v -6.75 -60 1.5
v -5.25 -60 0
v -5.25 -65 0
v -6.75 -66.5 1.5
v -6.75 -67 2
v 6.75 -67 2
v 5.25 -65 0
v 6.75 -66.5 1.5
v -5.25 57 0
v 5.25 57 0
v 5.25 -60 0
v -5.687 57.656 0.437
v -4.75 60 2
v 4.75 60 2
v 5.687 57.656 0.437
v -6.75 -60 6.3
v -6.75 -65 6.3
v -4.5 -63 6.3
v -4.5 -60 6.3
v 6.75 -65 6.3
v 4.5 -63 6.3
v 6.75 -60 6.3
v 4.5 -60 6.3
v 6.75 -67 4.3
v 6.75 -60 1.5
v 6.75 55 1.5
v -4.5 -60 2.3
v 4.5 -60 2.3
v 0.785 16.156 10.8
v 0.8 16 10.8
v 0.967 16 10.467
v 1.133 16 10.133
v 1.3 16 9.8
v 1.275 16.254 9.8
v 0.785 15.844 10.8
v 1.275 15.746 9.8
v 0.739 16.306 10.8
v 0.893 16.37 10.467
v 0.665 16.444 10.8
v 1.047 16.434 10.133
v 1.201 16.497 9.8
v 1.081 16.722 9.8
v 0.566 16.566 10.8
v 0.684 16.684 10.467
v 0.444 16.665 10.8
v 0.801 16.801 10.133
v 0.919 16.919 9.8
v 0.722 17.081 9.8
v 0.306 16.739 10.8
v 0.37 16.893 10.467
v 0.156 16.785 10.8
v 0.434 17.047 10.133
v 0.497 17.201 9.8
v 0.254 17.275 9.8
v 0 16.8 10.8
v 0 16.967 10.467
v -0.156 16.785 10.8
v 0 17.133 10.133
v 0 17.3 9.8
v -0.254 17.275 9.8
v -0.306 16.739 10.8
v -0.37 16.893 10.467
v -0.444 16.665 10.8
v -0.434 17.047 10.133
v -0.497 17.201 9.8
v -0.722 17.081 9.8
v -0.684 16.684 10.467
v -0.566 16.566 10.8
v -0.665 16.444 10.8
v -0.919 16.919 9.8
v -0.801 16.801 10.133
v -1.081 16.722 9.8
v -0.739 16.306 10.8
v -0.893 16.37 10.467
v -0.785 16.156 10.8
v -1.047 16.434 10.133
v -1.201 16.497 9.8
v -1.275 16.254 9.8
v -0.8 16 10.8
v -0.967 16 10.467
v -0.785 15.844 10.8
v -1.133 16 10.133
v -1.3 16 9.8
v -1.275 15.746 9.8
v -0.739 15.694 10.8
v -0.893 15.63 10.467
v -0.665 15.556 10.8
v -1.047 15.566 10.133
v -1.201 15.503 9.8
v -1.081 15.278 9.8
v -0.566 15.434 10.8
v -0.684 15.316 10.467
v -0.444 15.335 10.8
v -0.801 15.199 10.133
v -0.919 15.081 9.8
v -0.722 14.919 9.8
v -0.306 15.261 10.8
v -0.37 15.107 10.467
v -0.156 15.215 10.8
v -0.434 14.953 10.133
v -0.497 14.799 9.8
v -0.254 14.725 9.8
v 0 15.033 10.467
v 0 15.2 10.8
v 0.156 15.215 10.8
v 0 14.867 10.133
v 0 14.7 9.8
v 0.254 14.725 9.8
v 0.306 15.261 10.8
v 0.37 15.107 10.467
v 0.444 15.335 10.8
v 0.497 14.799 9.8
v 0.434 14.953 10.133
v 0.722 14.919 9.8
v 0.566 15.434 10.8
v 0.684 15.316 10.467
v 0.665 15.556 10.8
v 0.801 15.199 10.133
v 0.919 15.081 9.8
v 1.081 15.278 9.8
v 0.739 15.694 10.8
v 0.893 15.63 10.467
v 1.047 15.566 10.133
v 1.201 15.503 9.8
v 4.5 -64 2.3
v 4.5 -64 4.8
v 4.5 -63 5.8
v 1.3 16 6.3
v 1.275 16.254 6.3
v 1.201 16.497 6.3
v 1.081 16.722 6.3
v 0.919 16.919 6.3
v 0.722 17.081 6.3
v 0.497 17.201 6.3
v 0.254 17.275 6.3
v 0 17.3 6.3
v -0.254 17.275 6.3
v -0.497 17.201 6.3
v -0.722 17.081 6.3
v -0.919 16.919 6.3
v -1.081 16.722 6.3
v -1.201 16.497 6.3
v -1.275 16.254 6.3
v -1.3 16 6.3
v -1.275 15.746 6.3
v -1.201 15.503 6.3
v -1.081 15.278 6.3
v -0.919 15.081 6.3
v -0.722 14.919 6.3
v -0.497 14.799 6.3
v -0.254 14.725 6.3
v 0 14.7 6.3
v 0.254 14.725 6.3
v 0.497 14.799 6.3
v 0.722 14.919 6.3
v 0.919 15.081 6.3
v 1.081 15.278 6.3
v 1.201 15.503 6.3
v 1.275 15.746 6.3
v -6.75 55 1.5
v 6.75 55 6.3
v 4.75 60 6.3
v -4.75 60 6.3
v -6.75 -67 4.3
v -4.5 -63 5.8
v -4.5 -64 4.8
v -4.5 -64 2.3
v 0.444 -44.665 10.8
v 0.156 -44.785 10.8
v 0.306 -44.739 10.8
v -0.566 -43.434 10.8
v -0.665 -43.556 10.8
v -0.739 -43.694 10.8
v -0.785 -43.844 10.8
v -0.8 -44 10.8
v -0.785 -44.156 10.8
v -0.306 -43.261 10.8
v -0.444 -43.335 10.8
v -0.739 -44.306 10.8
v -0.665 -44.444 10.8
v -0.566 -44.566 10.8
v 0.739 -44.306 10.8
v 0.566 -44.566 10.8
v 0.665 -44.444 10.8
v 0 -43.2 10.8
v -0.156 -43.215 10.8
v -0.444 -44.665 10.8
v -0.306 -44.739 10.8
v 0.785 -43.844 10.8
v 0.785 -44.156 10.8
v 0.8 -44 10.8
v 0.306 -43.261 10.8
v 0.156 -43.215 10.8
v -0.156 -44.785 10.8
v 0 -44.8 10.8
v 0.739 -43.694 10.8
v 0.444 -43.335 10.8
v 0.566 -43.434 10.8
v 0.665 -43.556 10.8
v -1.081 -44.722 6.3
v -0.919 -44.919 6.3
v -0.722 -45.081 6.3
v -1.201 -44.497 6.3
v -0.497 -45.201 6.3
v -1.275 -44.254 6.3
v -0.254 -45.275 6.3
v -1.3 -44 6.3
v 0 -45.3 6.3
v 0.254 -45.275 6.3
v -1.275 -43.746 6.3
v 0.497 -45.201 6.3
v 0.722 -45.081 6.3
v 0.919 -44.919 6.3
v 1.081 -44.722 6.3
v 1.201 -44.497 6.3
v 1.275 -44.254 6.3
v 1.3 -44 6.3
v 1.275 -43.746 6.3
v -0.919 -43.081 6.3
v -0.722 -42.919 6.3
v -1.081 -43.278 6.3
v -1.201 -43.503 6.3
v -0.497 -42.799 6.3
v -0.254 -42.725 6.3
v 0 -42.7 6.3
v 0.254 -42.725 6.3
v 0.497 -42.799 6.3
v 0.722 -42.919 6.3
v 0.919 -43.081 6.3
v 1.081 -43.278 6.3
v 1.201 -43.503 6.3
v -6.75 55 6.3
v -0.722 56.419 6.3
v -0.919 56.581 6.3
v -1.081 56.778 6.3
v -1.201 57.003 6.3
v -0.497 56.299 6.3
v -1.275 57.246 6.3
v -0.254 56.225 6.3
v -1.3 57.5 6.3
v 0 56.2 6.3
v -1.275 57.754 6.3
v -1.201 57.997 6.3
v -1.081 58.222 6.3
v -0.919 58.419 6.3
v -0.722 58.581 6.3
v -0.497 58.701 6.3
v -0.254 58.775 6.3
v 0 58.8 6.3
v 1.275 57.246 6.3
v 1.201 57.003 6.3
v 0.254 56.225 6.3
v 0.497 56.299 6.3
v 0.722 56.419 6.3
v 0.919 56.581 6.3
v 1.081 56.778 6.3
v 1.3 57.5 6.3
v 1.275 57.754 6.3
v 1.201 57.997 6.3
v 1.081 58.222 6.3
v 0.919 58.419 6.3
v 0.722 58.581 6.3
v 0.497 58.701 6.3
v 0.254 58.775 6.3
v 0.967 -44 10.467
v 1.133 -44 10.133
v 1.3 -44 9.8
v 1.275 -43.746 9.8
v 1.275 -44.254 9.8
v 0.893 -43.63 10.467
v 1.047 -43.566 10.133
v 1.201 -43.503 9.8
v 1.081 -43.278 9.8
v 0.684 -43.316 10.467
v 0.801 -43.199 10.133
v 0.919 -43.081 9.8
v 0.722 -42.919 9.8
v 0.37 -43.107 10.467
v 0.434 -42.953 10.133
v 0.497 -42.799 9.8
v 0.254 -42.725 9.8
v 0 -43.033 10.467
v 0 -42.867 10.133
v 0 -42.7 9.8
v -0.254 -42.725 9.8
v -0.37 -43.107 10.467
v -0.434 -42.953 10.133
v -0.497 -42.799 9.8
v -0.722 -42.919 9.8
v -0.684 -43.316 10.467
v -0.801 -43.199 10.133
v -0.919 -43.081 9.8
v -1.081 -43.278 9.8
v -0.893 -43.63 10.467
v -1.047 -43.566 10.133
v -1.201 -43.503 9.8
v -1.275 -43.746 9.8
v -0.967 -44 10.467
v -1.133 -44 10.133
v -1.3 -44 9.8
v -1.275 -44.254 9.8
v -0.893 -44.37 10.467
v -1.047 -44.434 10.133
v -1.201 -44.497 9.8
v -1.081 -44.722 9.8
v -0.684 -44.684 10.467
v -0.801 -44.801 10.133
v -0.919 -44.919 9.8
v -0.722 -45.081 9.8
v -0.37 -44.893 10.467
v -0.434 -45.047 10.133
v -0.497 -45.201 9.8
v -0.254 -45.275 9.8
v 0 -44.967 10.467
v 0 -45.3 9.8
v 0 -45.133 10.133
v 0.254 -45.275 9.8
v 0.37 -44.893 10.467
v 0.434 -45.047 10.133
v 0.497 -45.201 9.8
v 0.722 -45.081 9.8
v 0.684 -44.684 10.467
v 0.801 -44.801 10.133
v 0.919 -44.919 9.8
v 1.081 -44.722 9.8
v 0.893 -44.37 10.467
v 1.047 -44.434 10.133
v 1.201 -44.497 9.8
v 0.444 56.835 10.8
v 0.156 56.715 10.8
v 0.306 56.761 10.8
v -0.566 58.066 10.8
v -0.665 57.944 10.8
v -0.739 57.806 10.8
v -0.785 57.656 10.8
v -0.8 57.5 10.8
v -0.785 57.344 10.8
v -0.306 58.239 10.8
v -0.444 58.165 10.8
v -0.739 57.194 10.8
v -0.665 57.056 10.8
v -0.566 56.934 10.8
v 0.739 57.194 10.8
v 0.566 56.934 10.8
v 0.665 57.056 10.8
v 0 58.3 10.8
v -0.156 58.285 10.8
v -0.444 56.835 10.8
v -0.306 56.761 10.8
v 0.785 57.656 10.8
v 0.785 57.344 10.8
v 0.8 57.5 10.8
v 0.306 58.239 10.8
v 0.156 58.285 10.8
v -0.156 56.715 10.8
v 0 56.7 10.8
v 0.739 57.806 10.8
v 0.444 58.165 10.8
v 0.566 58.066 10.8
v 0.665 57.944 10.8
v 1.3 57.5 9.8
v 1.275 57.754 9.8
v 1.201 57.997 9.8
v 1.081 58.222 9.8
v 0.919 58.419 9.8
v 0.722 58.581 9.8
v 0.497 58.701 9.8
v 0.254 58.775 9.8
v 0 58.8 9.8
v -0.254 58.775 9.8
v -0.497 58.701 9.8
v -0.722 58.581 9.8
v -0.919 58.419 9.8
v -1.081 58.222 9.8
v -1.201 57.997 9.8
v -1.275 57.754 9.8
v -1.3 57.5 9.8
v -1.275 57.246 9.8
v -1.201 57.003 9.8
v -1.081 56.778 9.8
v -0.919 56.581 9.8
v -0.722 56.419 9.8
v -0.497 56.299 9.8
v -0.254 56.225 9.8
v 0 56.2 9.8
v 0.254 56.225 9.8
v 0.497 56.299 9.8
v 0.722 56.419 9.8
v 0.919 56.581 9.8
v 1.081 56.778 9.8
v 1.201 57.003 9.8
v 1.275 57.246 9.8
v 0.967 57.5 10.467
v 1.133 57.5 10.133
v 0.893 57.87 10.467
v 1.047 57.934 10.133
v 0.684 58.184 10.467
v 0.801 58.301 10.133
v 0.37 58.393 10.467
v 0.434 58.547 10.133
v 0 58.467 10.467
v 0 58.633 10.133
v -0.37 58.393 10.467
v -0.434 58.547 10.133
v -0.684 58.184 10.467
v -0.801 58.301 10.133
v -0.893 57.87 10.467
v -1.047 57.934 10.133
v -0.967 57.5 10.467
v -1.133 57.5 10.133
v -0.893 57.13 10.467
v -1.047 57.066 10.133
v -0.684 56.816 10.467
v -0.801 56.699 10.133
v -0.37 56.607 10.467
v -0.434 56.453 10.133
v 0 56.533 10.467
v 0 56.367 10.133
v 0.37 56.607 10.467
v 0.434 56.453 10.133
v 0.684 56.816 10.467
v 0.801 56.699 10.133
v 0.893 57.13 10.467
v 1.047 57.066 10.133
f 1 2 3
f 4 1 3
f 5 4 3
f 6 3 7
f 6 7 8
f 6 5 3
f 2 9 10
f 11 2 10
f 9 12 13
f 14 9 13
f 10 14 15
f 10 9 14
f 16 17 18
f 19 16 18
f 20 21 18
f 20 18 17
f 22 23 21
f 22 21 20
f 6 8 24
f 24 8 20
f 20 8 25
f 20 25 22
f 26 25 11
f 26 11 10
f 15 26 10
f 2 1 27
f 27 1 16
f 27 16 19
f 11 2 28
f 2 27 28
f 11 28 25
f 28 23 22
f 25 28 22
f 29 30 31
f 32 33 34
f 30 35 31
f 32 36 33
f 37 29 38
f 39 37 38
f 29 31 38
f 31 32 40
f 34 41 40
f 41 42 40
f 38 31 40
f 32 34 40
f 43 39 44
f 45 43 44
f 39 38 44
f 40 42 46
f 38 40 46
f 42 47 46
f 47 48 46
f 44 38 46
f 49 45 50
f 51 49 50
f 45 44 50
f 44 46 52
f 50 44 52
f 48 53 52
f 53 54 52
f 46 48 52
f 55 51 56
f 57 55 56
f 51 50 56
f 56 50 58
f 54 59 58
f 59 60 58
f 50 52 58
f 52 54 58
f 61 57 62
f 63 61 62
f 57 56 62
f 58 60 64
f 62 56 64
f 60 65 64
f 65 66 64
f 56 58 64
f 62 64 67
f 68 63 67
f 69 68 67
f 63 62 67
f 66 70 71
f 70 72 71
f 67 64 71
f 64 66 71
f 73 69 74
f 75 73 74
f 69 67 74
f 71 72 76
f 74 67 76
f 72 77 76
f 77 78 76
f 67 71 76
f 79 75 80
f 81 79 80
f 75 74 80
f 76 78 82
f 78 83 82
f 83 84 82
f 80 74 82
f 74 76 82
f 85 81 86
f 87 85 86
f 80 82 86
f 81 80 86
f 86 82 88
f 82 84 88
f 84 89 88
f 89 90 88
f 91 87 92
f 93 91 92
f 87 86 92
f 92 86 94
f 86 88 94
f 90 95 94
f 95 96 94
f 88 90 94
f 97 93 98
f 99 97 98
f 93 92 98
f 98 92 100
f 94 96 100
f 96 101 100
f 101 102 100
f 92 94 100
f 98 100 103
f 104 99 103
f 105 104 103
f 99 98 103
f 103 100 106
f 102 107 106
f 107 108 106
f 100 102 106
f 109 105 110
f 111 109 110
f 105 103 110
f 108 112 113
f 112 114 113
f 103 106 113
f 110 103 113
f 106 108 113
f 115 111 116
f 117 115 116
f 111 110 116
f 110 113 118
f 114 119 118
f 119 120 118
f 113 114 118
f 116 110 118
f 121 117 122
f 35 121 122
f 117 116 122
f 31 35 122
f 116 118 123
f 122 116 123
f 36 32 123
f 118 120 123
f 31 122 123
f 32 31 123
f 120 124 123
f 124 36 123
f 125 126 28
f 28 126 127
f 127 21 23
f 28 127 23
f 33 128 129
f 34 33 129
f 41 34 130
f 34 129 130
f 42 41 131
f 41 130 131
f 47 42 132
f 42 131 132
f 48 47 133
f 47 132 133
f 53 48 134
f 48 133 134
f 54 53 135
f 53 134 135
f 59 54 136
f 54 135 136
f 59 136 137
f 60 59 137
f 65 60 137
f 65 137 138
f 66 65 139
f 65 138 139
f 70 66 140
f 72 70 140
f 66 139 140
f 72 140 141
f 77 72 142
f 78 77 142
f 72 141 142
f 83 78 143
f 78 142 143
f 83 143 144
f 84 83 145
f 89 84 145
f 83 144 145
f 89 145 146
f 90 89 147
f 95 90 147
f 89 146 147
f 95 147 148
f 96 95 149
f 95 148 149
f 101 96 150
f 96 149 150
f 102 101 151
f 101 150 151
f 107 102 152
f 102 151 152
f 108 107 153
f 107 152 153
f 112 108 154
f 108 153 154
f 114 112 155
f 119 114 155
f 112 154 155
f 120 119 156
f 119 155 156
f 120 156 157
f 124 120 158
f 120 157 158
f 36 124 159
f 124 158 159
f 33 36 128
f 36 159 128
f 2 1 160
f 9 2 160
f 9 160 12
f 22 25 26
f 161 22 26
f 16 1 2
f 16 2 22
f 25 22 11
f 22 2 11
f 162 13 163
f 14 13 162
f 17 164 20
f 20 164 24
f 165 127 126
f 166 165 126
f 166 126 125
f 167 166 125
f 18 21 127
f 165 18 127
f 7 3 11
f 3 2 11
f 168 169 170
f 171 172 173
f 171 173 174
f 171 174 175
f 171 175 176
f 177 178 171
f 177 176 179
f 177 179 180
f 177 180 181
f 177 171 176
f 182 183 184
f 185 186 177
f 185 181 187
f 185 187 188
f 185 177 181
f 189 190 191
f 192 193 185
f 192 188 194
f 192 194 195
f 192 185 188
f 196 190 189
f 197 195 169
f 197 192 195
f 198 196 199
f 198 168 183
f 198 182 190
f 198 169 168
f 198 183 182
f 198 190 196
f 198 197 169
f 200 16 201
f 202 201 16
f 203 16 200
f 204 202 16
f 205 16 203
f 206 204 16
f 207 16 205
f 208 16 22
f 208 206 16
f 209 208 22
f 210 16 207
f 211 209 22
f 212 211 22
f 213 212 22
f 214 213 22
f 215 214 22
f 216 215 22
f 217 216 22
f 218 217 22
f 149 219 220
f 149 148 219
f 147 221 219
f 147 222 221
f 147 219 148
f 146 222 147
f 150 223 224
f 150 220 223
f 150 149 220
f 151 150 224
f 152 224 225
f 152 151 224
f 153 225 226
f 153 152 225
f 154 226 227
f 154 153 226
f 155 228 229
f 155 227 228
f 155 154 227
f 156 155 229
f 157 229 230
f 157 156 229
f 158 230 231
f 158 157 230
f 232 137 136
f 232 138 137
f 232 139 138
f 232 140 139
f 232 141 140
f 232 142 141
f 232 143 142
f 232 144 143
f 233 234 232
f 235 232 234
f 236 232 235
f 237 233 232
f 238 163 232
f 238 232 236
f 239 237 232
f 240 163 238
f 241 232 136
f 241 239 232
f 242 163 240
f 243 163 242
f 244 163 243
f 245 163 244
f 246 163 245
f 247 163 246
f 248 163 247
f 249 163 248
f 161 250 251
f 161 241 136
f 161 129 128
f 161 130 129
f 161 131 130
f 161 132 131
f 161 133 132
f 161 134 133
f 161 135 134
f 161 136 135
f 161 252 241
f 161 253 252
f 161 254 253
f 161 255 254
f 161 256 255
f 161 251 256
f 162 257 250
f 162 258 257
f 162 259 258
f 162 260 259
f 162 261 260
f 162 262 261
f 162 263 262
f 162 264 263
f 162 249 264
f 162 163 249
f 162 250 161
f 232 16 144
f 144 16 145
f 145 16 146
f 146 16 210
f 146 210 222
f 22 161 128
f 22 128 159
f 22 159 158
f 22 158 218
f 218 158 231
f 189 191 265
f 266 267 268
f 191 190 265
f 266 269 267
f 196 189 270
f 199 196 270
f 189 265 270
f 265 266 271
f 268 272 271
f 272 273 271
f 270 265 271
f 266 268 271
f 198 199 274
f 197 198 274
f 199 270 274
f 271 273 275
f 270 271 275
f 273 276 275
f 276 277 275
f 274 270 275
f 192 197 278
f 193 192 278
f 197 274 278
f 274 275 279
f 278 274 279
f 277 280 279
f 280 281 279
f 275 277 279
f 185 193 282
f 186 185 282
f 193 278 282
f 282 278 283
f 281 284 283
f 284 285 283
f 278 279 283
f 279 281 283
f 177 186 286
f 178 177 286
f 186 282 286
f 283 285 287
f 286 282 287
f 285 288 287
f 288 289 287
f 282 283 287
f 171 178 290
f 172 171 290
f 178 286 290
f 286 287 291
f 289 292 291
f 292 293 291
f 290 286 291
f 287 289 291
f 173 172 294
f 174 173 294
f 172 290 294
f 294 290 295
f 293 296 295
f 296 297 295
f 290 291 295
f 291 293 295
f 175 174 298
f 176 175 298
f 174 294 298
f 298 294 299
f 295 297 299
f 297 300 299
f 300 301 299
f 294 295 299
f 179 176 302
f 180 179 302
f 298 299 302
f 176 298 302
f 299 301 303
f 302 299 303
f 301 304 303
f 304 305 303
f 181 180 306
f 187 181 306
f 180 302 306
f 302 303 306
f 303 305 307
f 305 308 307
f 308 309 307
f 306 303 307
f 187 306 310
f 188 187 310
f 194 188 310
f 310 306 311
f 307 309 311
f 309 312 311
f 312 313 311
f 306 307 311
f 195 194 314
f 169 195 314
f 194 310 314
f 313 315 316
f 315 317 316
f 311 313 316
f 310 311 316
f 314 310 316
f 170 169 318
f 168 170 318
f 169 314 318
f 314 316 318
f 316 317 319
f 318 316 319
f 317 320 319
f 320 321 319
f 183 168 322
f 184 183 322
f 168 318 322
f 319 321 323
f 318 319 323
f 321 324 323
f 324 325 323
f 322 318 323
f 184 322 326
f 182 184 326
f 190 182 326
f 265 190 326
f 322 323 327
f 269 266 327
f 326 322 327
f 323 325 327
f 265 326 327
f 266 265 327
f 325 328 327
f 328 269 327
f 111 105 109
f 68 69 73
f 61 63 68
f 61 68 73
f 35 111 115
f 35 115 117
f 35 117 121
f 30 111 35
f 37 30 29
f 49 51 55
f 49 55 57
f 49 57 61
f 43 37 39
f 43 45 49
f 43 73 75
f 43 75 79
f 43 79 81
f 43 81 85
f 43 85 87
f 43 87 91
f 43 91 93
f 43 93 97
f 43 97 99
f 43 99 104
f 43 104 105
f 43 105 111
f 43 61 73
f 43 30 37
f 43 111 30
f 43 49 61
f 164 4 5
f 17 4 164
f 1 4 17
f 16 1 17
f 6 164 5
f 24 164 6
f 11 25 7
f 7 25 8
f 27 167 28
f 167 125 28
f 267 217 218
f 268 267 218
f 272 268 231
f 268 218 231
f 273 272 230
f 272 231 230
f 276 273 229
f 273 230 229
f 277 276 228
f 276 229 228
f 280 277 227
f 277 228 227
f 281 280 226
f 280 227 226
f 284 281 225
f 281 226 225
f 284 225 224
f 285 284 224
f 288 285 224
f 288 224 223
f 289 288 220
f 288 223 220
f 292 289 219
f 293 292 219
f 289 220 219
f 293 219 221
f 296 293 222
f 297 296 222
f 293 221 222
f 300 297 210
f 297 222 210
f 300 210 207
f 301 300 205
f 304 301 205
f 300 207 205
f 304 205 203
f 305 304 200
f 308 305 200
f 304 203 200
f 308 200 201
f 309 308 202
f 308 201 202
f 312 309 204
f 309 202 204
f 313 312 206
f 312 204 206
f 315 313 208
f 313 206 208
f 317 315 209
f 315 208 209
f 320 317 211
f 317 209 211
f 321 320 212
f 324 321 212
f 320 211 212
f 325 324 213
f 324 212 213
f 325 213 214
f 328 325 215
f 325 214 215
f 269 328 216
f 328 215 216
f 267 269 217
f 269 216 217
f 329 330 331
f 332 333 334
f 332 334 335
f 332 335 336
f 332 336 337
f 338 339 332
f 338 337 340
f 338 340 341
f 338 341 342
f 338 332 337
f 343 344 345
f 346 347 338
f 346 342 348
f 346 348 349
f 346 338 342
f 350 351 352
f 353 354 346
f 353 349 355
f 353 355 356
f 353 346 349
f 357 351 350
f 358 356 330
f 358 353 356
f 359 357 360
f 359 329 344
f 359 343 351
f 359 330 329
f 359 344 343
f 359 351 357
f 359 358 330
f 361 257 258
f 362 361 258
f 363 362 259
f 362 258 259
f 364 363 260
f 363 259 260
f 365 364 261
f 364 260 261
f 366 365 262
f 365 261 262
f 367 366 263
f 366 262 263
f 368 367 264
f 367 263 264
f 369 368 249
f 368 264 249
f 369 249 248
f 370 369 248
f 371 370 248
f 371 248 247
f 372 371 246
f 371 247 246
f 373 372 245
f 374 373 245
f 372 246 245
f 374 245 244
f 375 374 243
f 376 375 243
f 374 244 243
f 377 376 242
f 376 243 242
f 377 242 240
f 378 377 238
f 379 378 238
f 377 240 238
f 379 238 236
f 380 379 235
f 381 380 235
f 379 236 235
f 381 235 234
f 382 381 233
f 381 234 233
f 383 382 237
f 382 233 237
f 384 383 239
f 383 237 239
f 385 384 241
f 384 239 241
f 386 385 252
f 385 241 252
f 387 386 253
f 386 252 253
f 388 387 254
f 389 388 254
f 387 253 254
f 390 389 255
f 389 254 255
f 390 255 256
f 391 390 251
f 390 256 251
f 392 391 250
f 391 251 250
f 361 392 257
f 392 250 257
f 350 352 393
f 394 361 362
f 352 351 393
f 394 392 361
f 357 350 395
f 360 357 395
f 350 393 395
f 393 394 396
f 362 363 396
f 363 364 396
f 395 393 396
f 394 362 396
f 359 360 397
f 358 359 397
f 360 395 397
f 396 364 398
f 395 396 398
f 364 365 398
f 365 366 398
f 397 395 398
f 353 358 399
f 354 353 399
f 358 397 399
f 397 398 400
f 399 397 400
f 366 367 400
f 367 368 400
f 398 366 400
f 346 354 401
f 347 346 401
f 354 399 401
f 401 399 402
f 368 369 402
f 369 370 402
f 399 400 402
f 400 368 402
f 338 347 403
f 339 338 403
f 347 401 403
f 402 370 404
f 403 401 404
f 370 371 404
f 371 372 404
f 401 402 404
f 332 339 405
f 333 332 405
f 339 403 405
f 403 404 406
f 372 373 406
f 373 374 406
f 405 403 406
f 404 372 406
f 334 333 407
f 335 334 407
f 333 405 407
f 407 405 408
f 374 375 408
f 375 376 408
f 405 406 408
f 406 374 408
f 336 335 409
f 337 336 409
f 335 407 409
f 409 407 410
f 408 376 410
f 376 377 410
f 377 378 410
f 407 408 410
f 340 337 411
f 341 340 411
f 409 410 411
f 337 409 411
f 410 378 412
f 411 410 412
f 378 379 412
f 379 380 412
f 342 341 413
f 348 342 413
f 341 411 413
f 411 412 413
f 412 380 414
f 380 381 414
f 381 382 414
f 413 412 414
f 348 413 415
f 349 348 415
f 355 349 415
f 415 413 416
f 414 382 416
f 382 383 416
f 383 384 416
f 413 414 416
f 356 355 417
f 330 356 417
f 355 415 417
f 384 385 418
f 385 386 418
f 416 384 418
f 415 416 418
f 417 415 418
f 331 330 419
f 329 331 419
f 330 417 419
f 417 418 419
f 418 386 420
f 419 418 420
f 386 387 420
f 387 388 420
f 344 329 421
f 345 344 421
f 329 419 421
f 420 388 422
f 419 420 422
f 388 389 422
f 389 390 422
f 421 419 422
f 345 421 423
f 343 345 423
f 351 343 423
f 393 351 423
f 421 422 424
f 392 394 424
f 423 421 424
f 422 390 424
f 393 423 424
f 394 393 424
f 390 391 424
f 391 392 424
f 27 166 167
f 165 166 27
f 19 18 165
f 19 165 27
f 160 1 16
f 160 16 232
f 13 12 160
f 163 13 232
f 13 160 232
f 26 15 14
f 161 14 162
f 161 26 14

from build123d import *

# Parameters (mm, degrees)
F0_W       = 13.5
F0_H       = 120
F1_DEPTH   = 6.3
F2_R       = 1.3
F3_DEPTH   = 4.5
F4_SIZE2   = 5
F4_SIZE    = 2
F5_SIZE2   = 1
F5_SIZE    = 0.5
F5_2_SIZE2 = 1
F5_2_SIZE  = 0.5
F5_3_SIZE2 = 1
F5_3_SIZE  = 0.5
F6_W       = 13.5
F6_H       = 6.3
F7_DEPTH   = 7
F9_DEPTH   = 4.5
F10_SIZE   = 2
F11_SIZE2  = 3
F11_SIZE   = 2
F12_SIZE   = 1.5
F12_2_SIZE = 1.5


with BuildPart() as f1:
    # F0 (on Top) → F1 (new body)
    with BuildSketch(Plane.XY):
        Rectangle(F0_W, F0_H)
    extrude(amount=F1_DEPTH)

    # F2 (on face) → F3 (join)
    with BuildSketch(Plane.XY.offset(6.3)):
        with Locations((0, 57.5)):
            Circle(F2_R)
        with Locations((0, 16)):
            Circle(F2_R)
        with Locations((0, -44)):
            Circle(F2_R)
    extrude(amount=F3_DEPTH)

    # F4
    f4_edges = [f1.edges().sort_by_distance(p)[0] for p in [
        (6.75, 60, 3.15),
        (-6.75, 60, 3.15),
    ]]
    f4_side = f1.faces().sort_by_distance((0, 60, 3.15))[0]
    chamfer(f4_edges, length=F4_SIZE, length2=F4_SIZE2, reference=f4_side)

    # F5
    f5_edges = [f1.edges().sort_by_distance(p)[0] for p in [
        (-1.3, -44, 10.8),
    ]]
    f5_side = f1.faces().sort_by_distance((0, -44, 10.8))[0]
    chamfer(f5_edges, length=F5_SIZE, length2=F5_SIZE2, reference=f5_side)

    # F5#2
    f5_2_edges = [f1.edges().sort_by_distance(p)[0] for p in [
        (-1.3, 16, 10.8),
    ]]
    f5_2_side = f1.faces().sort_by_distance((0, 16, 10.8))[0]
    chamfer(f5_2_edges, length=F5_2_SIZE, length2=F5_2_SIZE2, reference=f5_2_side)

    # F5#3
    f5_3_edges = [f1.edges().sort_by_distance(p)[0] for p in [
        (-1.3, 57.5, 10.8),
    ]]
    f5_3_side = f1.faces().sort_by_distance((0, 57.5, 10.8))[0]
    chamfer(f5_3_edges, length=F5_3_SIZE, length2=F5_3_SIZE2, reference=f5_3_side)

    # F11
    f11_edges = [f1.edges().sort_by_distance(p)[0] for p in [
        (0, 60, 0),
    ]]
    f11_side = f1.faces().sort_by_distance((0, 60, 3.15))[0]
    chamfer(f11_edges, length=F11_SIZE, length2=F11_SIZE2, reference=f11_side)

    # F12
    f12_edges = [f1.edges().sort_by_distance(p)[0] for p in [
        (6.75, -2.5, 0),
        (-6.75, -2.5, 0),
    ]]
    chamfer(f12_edges, length=F12_SIZE)


with BuildPart() as f7:
    # F6 (on face) → F7 (new body)
    with BuildSketch(Plane.XZ.offset(60)):
        with Locations((0, 3.15)):
            Rectangle(F6_W, F6_H)
    extrude(amount=F7_DEPTH)

    # F8 (on Right) → F9 (cut, symmetric)
    with BuildSketch(Plane.YZ):
        Polygon((-60, 6.3), (-63, 6.3), (-63, 5.8), (-64, 4.8), (-64, 2.3), (-60, 2.3), align=None)
    extrude(amount=F9_DEPTH, both=True, mode=Mode.SUBTRACT)

    # F10
    f10_edges = [f7.edges().sort_by_distance(p)[0] for p in [
        (0, -67, 6.3),
        (0, -67, 0),
    ]]
    chamfer(f10_edges, length=F10_SIZE)

    # F12#2
    f12_2_edges = [f7.edges().sort_by_distance(p)[0] for p in [
        (6.75, -62.5, 0),
        (-6.75, -62.5, 0),
    ]]
    chamfer(f12_2_edges, length=F12_2_SIZE)


solid = Compound([f1.part, f7.part])
